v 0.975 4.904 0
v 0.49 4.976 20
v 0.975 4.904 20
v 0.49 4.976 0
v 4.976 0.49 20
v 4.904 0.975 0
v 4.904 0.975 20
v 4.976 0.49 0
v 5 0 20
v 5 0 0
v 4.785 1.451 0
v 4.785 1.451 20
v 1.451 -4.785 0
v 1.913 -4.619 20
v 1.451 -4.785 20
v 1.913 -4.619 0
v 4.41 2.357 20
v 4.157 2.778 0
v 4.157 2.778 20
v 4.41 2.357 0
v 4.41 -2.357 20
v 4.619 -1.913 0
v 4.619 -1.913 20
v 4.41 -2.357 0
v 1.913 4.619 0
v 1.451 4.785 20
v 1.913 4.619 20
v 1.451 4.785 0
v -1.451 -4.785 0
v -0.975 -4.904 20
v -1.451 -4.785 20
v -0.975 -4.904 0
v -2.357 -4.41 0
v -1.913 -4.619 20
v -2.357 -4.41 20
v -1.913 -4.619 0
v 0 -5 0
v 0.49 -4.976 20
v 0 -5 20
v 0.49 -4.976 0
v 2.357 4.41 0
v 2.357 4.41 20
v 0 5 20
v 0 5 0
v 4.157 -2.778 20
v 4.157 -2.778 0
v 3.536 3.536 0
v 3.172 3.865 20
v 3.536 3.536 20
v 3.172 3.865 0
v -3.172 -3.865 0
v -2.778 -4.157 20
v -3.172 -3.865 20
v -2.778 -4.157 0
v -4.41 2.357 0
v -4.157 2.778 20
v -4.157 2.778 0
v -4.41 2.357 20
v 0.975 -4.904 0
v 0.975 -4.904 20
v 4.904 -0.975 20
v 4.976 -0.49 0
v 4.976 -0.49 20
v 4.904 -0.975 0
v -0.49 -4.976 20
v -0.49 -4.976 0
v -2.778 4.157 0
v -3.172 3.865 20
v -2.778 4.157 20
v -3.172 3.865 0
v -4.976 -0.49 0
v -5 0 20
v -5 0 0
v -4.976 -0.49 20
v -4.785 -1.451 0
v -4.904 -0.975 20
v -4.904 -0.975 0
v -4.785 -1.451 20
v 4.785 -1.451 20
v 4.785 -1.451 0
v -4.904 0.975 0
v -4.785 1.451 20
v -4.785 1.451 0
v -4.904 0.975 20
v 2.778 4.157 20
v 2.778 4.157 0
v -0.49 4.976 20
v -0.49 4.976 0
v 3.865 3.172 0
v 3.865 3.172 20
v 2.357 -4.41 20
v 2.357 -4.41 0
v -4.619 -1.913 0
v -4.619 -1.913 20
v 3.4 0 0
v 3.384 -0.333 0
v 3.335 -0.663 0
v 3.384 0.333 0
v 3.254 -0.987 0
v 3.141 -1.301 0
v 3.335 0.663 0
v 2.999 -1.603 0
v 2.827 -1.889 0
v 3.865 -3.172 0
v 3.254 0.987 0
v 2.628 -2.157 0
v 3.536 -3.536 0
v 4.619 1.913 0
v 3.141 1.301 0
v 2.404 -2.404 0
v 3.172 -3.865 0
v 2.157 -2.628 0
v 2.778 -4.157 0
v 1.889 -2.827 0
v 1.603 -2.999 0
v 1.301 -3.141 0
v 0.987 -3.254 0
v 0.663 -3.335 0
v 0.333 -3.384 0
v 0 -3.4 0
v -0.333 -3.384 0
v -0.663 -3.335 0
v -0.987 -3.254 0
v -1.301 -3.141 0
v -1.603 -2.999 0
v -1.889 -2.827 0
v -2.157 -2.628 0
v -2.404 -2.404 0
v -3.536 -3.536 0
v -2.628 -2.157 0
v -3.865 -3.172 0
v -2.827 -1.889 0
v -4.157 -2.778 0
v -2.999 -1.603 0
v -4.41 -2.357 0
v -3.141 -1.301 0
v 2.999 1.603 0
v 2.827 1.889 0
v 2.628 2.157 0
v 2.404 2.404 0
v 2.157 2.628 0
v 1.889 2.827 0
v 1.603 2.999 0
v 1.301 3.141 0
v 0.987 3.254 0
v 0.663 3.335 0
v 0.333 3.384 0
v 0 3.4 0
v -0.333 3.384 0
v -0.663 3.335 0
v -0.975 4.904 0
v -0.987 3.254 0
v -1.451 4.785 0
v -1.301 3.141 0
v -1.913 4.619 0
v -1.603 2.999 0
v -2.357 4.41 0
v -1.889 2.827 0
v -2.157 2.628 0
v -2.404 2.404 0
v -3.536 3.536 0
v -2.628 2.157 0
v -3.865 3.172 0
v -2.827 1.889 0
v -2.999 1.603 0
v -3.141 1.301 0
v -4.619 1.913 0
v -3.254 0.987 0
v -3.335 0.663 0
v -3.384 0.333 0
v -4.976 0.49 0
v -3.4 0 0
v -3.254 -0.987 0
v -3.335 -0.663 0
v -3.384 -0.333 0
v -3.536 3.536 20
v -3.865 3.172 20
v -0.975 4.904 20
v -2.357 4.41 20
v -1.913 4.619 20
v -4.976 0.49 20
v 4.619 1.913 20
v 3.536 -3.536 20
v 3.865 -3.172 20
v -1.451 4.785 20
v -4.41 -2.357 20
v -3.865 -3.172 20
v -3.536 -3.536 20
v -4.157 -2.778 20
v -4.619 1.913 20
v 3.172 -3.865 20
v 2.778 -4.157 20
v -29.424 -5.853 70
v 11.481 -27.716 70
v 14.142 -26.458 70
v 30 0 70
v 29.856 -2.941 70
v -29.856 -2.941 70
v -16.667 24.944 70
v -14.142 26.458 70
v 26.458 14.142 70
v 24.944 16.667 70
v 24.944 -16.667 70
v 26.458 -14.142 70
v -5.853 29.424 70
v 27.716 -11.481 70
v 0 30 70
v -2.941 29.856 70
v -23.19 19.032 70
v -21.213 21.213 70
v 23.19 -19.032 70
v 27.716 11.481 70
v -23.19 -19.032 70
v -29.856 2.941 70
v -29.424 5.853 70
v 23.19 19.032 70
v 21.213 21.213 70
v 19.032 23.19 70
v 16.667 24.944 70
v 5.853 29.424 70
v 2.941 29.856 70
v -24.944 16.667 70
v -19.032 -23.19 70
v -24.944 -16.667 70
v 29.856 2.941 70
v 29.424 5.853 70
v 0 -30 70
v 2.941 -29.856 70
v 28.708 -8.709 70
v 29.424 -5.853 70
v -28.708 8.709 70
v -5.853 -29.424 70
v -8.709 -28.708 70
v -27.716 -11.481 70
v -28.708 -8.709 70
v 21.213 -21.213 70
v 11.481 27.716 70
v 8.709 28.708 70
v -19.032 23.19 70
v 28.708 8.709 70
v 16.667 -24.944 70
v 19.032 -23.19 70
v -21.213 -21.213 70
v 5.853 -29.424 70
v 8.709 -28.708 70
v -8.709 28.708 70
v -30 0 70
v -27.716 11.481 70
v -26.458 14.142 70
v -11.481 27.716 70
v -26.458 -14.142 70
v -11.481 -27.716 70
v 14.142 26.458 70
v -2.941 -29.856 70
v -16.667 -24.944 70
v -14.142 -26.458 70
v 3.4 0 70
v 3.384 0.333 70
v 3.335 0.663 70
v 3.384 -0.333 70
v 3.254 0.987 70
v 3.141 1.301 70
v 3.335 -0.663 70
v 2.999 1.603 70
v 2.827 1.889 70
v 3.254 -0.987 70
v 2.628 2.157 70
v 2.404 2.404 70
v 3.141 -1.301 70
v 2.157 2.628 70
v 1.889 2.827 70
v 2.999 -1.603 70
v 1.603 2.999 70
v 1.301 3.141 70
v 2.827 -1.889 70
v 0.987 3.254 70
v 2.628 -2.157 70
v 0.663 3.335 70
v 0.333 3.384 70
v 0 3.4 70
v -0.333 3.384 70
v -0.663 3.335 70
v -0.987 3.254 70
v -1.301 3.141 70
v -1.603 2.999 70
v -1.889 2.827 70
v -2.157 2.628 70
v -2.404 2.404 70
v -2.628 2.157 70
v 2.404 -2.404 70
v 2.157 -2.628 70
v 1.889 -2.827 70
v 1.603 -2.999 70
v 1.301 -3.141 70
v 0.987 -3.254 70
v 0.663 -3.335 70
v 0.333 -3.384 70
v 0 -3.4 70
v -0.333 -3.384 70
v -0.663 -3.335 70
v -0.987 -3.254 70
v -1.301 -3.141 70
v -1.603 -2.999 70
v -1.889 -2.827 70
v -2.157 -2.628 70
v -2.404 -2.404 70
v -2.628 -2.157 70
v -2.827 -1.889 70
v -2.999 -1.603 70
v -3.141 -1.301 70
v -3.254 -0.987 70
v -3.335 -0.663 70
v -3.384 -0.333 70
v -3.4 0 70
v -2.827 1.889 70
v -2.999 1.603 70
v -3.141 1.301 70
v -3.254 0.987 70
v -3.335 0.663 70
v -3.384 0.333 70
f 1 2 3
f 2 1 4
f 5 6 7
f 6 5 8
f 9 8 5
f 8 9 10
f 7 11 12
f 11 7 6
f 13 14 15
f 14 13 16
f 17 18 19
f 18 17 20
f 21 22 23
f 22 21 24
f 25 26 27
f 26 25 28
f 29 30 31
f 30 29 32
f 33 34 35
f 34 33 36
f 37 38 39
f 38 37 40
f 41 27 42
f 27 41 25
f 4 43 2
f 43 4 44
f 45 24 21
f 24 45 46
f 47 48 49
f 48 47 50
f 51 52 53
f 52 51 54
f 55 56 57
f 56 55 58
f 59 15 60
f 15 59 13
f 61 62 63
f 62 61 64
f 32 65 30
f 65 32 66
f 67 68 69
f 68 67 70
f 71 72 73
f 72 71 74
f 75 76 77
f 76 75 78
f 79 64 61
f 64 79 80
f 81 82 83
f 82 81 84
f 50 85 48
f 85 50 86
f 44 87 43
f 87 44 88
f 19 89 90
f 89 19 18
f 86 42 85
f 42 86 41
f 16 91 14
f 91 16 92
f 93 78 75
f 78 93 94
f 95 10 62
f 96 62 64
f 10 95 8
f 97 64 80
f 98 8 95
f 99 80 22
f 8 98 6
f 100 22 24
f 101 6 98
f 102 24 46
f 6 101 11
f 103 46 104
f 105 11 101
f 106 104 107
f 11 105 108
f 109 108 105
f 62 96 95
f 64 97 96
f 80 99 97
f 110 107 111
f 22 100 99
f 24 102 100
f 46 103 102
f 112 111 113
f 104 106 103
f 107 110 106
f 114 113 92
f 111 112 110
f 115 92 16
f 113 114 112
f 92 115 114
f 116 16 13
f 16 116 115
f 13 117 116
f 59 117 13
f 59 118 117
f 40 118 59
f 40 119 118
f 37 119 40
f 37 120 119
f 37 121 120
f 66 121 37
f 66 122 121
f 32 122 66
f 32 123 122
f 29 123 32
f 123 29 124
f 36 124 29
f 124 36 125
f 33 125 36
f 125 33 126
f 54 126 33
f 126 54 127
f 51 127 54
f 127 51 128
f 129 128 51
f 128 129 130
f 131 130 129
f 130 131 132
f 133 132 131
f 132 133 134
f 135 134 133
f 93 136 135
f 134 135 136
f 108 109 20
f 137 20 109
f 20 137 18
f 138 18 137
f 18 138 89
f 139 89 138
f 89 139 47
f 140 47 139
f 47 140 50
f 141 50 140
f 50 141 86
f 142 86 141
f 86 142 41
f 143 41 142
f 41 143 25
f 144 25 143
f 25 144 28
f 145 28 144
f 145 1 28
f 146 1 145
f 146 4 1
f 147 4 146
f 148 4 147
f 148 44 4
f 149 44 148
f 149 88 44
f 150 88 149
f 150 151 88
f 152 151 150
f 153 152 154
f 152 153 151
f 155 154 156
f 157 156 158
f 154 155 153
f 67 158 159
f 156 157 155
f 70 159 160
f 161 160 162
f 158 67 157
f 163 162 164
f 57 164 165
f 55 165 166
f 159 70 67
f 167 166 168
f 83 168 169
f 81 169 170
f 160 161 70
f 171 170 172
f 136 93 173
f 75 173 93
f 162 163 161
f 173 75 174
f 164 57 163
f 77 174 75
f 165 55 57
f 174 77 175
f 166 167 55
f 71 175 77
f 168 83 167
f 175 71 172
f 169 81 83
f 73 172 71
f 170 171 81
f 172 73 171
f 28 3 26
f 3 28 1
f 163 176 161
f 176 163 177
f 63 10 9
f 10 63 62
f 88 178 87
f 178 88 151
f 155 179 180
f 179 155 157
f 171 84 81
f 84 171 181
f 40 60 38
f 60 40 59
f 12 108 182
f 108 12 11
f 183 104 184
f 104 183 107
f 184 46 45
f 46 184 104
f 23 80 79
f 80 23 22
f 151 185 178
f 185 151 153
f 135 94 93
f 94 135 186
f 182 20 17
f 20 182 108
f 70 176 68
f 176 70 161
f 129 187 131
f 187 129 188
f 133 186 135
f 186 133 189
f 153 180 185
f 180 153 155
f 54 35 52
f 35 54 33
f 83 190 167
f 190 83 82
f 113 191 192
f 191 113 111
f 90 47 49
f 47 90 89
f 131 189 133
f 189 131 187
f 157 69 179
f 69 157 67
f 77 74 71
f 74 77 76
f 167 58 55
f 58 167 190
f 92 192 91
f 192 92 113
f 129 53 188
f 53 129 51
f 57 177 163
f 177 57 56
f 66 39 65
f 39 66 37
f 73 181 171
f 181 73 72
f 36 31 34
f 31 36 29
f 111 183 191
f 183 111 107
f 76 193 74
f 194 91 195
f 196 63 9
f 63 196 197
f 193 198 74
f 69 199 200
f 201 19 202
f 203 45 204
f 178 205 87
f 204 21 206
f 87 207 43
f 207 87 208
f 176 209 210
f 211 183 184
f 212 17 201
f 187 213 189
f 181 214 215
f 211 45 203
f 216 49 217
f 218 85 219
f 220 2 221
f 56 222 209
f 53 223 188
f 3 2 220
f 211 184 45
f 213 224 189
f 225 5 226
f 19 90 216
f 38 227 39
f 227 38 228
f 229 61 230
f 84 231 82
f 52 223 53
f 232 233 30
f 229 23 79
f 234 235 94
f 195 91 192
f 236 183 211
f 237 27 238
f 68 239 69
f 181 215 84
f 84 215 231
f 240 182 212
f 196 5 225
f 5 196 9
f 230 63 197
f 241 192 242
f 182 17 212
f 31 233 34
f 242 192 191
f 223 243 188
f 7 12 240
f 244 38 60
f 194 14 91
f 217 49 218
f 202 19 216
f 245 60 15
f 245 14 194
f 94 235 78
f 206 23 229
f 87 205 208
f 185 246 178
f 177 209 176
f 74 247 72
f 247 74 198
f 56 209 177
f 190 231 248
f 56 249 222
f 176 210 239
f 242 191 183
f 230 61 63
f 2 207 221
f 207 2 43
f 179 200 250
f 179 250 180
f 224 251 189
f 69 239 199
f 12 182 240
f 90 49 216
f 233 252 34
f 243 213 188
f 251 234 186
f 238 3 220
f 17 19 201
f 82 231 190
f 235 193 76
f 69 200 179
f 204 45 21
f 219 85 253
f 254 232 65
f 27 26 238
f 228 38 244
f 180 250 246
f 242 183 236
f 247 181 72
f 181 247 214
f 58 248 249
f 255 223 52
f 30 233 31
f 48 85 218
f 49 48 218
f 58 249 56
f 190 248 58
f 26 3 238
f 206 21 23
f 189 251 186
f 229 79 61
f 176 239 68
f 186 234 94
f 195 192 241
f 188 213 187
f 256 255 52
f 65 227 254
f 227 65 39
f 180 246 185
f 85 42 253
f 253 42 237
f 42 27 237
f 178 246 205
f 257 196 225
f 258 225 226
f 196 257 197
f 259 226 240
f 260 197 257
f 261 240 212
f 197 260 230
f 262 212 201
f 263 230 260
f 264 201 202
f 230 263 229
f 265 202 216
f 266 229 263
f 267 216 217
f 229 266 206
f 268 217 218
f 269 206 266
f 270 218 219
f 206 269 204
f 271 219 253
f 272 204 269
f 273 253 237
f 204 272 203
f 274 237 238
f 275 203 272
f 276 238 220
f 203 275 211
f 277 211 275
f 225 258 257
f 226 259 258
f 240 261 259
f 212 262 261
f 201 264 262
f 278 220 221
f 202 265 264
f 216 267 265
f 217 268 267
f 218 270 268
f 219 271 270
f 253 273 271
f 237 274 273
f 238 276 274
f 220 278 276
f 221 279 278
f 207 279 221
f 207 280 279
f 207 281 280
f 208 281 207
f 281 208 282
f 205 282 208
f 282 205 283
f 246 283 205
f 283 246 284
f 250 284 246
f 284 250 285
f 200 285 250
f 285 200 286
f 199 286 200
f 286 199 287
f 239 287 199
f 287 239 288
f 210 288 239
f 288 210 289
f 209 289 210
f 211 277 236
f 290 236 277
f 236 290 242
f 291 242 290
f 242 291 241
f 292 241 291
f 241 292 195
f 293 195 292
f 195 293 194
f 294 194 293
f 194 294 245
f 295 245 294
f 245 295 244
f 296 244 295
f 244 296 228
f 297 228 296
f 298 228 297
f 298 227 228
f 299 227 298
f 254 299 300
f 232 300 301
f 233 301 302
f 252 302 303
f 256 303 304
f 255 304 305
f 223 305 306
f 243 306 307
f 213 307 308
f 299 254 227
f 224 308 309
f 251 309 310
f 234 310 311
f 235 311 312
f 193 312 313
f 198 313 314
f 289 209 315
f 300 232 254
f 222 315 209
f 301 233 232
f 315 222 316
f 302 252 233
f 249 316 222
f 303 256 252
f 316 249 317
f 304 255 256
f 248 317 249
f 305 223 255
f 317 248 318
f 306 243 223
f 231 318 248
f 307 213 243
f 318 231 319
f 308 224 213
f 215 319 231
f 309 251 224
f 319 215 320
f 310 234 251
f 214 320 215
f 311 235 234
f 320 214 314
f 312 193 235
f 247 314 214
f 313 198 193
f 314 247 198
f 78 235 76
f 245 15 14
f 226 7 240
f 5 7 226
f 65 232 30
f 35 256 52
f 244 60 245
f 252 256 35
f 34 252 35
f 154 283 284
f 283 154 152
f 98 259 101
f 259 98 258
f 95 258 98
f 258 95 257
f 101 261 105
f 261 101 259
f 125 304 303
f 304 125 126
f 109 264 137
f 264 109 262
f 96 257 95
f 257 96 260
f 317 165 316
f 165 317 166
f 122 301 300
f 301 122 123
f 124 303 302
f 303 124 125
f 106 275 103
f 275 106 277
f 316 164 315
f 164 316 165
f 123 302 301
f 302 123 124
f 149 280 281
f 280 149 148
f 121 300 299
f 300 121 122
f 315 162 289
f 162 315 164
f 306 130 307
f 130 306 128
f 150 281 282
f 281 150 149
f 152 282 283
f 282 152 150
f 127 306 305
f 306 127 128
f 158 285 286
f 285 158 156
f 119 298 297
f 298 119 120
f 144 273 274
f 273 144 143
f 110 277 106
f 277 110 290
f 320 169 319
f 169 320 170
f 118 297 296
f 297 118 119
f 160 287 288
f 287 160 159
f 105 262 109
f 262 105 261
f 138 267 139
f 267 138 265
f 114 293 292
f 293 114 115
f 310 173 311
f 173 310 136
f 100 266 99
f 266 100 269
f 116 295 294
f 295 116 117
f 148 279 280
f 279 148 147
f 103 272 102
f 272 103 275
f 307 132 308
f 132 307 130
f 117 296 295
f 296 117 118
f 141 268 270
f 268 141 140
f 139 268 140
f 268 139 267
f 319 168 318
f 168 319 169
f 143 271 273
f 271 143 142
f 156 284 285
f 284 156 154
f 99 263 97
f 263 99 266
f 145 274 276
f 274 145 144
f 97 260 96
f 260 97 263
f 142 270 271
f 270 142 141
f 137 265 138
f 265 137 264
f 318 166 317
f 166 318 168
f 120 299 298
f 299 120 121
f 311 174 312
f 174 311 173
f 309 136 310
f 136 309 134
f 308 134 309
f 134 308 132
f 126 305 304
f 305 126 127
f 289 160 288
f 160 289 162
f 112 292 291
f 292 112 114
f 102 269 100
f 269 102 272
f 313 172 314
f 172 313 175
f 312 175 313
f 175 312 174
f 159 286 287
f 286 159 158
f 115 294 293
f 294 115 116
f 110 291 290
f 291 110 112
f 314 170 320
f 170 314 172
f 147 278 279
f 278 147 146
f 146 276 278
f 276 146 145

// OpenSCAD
// Funnel - a spout (tube) sitting below a conical section, open at both ends. NOVEL general part.
//

spout_d = 10;
spout_l = 20;
cone_d1 = 10;
cone_d2 = 60;
wall    = 1.6;

$fn = 64;

ib = spout_d - 2 * wall;   // spout bore
ic = cone_d1 - 2 * wall;   // cone inner diameter at the join

difference() {
    union() {
        cylinder(h = spout_l, d = spout_d);                 // spout
        translate([0, 0, spout_l]) cylinder(h = cone_d2 - cone_d1, d1 = cone_d1, d2 = cone_d2);  // cone
    }
    translate([0, 0, -1]) cylinder(h = spout_l + 2, d = ib);                     // bore through spout
    translate([0, 0, spout_l - 1]) cylinder(h = (cone_d2 - cone_d1) + 2, d = ic);  // bore through cone
}
